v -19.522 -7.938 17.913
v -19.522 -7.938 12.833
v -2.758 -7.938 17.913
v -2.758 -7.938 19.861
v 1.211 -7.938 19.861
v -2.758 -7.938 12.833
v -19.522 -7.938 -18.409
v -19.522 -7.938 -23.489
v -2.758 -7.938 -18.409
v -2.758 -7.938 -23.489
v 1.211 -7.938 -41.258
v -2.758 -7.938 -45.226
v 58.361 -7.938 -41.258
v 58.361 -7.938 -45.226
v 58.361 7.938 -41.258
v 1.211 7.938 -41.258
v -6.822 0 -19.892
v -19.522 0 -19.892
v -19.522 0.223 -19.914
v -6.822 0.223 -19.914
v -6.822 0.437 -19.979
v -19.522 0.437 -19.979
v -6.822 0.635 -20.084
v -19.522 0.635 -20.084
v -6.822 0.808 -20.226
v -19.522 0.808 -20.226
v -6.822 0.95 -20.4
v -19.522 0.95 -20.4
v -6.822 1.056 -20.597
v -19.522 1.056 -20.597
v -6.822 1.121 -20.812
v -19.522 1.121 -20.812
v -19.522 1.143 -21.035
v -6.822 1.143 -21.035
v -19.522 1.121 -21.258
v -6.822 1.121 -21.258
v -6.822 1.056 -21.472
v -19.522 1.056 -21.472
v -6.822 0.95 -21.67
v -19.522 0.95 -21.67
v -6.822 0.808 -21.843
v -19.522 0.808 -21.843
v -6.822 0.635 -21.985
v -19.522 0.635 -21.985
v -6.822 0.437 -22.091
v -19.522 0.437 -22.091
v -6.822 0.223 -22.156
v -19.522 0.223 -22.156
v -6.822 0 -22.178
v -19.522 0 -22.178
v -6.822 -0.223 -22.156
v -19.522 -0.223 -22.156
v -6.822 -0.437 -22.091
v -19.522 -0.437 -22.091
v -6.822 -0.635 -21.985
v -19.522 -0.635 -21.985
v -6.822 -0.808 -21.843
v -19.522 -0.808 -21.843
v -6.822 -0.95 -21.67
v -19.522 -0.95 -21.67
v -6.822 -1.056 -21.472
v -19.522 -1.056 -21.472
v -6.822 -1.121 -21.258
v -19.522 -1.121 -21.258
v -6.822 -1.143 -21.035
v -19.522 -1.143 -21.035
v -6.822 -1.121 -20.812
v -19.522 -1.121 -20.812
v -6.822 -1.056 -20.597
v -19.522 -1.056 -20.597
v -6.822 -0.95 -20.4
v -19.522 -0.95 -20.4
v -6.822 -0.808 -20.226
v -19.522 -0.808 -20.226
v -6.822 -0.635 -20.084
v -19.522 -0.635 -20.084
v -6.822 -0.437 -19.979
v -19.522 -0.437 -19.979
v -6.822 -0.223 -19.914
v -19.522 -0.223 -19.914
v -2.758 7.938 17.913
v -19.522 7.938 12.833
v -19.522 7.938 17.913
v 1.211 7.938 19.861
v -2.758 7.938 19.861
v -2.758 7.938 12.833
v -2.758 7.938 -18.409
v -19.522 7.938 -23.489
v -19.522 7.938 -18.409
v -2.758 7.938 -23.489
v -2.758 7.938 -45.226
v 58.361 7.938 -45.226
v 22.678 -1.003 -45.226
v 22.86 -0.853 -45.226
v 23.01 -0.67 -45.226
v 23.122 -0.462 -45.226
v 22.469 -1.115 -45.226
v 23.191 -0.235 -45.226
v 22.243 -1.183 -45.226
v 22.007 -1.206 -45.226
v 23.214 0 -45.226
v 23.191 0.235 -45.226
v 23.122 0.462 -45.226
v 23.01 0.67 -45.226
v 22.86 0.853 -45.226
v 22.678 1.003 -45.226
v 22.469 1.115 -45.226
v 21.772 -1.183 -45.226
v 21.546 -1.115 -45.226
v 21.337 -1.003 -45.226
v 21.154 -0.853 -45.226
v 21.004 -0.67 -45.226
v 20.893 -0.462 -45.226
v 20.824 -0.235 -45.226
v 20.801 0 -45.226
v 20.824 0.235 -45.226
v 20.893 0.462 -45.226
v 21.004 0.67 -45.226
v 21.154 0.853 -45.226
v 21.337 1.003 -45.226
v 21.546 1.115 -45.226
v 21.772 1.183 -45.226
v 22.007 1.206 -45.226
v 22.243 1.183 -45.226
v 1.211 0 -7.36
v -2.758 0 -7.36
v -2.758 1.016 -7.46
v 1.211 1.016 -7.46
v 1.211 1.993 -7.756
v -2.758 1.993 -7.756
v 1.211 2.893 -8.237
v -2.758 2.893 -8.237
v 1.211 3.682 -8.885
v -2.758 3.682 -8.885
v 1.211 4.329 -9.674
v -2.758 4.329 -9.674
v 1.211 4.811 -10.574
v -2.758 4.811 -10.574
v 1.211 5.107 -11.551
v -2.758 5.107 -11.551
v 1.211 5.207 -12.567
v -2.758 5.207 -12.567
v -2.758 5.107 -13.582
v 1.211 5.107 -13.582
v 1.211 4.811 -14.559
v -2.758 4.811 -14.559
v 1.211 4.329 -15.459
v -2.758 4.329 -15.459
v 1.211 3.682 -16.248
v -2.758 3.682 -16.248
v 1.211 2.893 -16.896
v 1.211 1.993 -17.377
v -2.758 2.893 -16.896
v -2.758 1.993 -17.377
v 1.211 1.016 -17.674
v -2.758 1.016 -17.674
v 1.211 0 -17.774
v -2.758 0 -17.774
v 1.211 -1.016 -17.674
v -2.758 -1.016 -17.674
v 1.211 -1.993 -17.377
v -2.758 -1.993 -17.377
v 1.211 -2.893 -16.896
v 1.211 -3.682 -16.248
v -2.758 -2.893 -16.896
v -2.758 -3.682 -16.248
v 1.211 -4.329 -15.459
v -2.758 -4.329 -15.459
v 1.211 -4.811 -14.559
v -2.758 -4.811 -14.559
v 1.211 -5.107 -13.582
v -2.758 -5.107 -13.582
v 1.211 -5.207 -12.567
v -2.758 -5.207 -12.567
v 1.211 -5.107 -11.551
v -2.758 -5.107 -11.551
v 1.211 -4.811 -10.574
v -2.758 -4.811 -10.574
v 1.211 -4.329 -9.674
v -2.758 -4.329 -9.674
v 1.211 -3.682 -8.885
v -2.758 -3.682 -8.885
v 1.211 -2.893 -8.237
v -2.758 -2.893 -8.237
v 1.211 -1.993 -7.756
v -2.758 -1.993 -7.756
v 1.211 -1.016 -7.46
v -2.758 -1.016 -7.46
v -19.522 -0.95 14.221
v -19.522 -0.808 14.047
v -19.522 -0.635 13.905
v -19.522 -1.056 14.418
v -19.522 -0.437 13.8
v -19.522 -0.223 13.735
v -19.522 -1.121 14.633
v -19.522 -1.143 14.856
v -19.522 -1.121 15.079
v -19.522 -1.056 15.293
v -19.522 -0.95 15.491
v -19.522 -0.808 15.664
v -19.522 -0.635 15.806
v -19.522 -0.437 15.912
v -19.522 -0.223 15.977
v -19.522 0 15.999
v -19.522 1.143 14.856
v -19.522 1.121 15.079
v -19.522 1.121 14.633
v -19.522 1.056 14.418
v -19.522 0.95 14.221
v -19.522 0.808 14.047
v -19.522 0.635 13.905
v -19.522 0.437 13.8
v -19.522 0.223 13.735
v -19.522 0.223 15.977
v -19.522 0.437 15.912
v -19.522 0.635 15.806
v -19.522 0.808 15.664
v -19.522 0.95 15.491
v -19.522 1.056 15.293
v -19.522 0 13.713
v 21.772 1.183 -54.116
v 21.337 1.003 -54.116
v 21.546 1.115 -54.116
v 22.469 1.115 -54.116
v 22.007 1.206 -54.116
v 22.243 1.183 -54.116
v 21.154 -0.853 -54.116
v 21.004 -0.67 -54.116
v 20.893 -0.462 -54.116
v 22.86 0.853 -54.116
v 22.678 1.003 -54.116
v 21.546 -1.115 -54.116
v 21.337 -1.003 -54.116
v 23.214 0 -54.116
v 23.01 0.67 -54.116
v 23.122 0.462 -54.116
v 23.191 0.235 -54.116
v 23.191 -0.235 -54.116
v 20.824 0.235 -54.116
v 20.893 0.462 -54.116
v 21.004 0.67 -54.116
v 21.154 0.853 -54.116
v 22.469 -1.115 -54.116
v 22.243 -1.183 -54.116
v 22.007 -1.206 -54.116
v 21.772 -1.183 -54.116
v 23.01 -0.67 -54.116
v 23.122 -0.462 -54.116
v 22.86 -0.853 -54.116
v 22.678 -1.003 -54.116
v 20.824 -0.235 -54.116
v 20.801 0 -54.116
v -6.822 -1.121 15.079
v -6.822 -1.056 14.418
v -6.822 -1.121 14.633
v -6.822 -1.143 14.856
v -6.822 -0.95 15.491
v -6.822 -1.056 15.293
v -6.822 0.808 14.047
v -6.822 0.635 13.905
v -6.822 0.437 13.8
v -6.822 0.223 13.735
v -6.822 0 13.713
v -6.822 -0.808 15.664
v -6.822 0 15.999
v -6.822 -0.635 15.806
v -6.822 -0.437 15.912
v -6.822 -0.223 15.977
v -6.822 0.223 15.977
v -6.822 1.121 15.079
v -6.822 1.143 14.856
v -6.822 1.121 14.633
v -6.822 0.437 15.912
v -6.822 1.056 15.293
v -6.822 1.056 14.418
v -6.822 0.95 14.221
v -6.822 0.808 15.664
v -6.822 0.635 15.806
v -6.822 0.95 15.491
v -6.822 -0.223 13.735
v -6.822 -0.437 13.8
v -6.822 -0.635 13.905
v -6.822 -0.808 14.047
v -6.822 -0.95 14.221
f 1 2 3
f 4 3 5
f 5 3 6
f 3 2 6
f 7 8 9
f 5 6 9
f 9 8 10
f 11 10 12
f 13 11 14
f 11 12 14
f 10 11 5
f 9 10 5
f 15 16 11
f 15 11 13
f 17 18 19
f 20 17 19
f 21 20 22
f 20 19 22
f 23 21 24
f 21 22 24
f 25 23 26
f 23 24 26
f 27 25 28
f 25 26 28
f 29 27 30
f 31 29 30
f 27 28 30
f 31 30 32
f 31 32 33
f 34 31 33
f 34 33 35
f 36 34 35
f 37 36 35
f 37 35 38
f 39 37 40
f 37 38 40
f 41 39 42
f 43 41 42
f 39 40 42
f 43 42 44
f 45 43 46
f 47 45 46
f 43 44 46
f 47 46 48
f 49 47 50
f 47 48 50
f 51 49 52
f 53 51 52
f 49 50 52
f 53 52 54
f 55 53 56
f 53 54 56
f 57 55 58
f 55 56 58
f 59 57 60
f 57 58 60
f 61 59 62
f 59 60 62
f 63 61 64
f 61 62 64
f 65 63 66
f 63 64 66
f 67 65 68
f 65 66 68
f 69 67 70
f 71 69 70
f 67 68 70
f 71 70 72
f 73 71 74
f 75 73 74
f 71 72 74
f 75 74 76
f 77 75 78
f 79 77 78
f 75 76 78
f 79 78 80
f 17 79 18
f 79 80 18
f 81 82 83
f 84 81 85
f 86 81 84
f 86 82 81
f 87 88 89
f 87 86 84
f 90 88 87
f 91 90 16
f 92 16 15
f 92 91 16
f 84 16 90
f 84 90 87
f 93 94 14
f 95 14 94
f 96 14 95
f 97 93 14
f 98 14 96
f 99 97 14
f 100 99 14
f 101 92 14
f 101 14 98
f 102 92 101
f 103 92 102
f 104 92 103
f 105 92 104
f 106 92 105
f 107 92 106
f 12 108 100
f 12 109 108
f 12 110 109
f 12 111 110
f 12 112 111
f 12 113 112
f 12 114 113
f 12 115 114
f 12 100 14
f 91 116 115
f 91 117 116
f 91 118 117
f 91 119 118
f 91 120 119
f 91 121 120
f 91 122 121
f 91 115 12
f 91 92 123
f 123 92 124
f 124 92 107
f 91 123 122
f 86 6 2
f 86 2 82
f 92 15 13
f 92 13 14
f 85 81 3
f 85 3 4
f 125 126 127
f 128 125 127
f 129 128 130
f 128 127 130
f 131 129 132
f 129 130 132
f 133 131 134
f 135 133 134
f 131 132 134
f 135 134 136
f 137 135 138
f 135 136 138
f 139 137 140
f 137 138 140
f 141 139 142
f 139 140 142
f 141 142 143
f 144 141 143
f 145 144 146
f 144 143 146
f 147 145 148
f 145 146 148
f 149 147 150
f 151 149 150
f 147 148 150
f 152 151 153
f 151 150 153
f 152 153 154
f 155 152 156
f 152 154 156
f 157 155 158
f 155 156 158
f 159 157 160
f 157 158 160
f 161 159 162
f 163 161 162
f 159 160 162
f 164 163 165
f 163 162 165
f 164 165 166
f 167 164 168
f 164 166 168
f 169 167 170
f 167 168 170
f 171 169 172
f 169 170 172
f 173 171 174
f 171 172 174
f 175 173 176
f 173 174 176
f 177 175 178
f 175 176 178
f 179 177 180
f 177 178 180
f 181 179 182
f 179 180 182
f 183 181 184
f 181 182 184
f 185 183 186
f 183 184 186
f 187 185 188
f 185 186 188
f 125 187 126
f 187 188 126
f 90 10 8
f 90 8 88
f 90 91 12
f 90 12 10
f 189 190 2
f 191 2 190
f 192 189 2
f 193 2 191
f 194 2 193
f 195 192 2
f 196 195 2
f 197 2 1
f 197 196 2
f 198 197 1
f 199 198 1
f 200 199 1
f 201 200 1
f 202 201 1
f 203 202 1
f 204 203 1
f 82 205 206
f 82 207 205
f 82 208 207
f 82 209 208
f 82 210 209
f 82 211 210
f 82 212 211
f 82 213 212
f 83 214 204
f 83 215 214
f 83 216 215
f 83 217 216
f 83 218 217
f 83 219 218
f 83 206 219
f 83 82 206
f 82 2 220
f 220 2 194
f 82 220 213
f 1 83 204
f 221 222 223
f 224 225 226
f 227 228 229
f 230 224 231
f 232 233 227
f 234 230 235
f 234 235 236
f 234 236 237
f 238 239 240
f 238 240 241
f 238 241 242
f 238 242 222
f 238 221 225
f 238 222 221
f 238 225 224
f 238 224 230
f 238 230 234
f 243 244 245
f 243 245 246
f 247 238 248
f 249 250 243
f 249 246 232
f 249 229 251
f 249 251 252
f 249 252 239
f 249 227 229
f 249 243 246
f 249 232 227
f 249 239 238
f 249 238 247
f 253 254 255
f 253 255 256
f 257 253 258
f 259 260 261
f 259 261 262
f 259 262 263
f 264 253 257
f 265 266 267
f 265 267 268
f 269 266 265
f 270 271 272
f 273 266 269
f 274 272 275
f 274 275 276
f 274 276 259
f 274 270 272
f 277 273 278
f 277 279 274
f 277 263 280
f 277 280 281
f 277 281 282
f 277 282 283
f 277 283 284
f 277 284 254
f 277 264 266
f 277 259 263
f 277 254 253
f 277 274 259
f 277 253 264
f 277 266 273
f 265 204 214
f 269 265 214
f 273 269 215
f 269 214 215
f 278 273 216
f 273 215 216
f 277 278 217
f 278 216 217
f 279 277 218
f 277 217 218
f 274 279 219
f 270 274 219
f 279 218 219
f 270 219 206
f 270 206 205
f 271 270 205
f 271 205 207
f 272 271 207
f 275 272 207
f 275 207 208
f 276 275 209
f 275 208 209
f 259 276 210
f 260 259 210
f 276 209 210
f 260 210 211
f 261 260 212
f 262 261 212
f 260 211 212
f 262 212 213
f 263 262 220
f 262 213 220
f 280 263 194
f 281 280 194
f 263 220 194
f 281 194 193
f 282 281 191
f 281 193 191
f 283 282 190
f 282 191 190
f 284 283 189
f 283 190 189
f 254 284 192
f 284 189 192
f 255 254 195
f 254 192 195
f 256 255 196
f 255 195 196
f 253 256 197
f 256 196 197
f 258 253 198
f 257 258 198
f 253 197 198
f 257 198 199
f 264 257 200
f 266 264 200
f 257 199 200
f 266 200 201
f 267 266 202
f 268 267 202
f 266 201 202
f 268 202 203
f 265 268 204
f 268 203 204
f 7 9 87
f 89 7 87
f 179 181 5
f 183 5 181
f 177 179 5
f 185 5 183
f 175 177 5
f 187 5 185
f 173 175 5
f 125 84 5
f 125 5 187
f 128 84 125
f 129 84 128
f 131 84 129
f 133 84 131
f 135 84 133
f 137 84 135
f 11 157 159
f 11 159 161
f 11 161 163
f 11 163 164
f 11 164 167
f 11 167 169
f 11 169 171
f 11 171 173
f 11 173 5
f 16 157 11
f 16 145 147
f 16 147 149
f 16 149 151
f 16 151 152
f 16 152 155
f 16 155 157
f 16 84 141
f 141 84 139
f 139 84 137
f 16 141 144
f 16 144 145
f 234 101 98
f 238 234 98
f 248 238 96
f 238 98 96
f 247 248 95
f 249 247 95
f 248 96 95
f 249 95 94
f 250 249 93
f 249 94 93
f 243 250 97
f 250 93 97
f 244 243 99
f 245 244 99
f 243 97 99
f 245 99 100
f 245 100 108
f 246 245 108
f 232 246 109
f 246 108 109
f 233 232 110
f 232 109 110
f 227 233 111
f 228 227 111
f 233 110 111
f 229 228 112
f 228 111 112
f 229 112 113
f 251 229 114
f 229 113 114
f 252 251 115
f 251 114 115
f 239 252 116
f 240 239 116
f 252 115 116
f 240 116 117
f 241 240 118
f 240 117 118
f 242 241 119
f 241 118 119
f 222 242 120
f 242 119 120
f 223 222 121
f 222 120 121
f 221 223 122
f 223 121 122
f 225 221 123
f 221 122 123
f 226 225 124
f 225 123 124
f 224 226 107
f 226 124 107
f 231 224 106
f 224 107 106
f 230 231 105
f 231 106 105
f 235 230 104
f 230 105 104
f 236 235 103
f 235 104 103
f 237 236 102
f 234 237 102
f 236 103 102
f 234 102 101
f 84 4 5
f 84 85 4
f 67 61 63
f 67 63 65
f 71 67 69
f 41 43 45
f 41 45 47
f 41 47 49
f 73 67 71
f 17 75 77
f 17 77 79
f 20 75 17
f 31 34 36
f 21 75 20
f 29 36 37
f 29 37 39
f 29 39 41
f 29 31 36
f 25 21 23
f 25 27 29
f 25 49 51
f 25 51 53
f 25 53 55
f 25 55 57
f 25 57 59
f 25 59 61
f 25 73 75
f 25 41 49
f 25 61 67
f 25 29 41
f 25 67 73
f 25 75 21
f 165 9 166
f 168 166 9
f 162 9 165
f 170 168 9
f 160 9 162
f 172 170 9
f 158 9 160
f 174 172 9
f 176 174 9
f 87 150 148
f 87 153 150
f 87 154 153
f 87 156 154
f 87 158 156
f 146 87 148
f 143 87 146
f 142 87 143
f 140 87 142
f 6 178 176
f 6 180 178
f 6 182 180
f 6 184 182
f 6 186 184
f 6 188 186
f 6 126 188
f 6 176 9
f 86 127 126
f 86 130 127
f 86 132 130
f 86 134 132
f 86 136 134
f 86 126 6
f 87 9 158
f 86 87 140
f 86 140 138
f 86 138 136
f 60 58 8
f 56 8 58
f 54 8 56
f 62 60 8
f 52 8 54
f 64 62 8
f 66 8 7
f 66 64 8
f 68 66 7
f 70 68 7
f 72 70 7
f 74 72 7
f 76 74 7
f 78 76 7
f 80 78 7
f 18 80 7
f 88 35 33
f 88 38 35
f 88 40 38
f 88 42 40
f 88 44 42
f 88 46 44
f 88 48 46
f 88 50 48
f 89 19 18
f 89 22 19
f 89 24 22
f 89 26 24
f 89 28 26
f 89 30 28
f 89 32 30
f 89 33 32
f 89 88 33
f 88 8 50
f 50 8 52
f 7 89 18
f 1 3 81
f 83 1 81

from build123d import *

# Parameters (mm, degrees)
BOSS_EXTRUDE1_DEPTH = 7.9375
SKETCH3_R           = 5.207
CUT_EXTRUDE1_DEPTH  = 3.96875
SKETCH4_R           = 1.2065
BOSS_EXTRUDE2_DEPTH = 8.89
SKETCH5_W           = 5.08
SKETCH5_H           = 15.875
BOSS_EXTRUDE3_DEPTH = 16.764
SKETCH6_R           = 1.143
CUT_EXTRUDE2_DEPTH  = 12.7


with BuildPart() as part:
    # Sketch1 → Boss-Extrude1 (new, symmetric)
    with BuildSketch(Plane(origin=(0, 0, 0), x_dir=(1, 0, 0), z_dir=(0, 1, 0))):
        Polygon((-2.757708096, -19.86108723), (1.211041904, -19.86108723), (1.211041904, 41.25766277), (58.361041904, 41.25766277), (58.361041904, 45.22641277), (6.27967861, 45.22641277), (-2.757708096, 45.22641277), align=None)
    extrude(amount=BOSS_EXTRUDE1_DEPTH, both=True)

    # Sketch3 → Cut-Extrude1 (cut)
    with BuildSketch(Plane.ZY.offset(2.757708096)):
        with Locations((-12.566559842, 0)):
            Circle(SKETCH3_R)
    extrude(amount=-CUT_EXTRUDE1_DEPTH, mode=Mode.SUBTRACT)

    # Sketch4 → Boss-Extrude2 (add)
    with BuildSketch(Plane(origin=(0, 0, -45.22641277), x_dir=(-1, 0, 0), z_dir=(0, 0, -1))):
        with Locations(Location((-22.007291904, 0, 0), (0, 0, 180))):
            Circle(SKETCH4_R)
    extrude(amount=BOSS_EXTRUDE2_DEPTH)

    # Sketch5 → Boss-Extrude3 (add)
    with BuildSketch(Plane.ZY.offset(2.757708096)):
        with Locations((-20.948559842, 0)):
            Rectangle(SKETCH5_W, SKETCH5_H)
        with Locations((15.373440158, 0)):
            Rectangle(SKETCH5_W, SKETCH5_H)
    extrude(amount=BOSS_EXTRUDE3_DEPTH)

    # Sketch6 → Cut-Extrude2 (cut)
    with BuildSketch(Plane.ZY.offset(19.521708096)):
        with Locations((14.855640158, 0)):
            Circle(SKETCH6_R)
        with Locations((-21.034559842, 0)):
            Circle(SKETCH6_R)
    extrude(amount=-CUT_EXTRUDE2_DEPTH, mode=Mode.SUBTRACT)


solid = part.part
